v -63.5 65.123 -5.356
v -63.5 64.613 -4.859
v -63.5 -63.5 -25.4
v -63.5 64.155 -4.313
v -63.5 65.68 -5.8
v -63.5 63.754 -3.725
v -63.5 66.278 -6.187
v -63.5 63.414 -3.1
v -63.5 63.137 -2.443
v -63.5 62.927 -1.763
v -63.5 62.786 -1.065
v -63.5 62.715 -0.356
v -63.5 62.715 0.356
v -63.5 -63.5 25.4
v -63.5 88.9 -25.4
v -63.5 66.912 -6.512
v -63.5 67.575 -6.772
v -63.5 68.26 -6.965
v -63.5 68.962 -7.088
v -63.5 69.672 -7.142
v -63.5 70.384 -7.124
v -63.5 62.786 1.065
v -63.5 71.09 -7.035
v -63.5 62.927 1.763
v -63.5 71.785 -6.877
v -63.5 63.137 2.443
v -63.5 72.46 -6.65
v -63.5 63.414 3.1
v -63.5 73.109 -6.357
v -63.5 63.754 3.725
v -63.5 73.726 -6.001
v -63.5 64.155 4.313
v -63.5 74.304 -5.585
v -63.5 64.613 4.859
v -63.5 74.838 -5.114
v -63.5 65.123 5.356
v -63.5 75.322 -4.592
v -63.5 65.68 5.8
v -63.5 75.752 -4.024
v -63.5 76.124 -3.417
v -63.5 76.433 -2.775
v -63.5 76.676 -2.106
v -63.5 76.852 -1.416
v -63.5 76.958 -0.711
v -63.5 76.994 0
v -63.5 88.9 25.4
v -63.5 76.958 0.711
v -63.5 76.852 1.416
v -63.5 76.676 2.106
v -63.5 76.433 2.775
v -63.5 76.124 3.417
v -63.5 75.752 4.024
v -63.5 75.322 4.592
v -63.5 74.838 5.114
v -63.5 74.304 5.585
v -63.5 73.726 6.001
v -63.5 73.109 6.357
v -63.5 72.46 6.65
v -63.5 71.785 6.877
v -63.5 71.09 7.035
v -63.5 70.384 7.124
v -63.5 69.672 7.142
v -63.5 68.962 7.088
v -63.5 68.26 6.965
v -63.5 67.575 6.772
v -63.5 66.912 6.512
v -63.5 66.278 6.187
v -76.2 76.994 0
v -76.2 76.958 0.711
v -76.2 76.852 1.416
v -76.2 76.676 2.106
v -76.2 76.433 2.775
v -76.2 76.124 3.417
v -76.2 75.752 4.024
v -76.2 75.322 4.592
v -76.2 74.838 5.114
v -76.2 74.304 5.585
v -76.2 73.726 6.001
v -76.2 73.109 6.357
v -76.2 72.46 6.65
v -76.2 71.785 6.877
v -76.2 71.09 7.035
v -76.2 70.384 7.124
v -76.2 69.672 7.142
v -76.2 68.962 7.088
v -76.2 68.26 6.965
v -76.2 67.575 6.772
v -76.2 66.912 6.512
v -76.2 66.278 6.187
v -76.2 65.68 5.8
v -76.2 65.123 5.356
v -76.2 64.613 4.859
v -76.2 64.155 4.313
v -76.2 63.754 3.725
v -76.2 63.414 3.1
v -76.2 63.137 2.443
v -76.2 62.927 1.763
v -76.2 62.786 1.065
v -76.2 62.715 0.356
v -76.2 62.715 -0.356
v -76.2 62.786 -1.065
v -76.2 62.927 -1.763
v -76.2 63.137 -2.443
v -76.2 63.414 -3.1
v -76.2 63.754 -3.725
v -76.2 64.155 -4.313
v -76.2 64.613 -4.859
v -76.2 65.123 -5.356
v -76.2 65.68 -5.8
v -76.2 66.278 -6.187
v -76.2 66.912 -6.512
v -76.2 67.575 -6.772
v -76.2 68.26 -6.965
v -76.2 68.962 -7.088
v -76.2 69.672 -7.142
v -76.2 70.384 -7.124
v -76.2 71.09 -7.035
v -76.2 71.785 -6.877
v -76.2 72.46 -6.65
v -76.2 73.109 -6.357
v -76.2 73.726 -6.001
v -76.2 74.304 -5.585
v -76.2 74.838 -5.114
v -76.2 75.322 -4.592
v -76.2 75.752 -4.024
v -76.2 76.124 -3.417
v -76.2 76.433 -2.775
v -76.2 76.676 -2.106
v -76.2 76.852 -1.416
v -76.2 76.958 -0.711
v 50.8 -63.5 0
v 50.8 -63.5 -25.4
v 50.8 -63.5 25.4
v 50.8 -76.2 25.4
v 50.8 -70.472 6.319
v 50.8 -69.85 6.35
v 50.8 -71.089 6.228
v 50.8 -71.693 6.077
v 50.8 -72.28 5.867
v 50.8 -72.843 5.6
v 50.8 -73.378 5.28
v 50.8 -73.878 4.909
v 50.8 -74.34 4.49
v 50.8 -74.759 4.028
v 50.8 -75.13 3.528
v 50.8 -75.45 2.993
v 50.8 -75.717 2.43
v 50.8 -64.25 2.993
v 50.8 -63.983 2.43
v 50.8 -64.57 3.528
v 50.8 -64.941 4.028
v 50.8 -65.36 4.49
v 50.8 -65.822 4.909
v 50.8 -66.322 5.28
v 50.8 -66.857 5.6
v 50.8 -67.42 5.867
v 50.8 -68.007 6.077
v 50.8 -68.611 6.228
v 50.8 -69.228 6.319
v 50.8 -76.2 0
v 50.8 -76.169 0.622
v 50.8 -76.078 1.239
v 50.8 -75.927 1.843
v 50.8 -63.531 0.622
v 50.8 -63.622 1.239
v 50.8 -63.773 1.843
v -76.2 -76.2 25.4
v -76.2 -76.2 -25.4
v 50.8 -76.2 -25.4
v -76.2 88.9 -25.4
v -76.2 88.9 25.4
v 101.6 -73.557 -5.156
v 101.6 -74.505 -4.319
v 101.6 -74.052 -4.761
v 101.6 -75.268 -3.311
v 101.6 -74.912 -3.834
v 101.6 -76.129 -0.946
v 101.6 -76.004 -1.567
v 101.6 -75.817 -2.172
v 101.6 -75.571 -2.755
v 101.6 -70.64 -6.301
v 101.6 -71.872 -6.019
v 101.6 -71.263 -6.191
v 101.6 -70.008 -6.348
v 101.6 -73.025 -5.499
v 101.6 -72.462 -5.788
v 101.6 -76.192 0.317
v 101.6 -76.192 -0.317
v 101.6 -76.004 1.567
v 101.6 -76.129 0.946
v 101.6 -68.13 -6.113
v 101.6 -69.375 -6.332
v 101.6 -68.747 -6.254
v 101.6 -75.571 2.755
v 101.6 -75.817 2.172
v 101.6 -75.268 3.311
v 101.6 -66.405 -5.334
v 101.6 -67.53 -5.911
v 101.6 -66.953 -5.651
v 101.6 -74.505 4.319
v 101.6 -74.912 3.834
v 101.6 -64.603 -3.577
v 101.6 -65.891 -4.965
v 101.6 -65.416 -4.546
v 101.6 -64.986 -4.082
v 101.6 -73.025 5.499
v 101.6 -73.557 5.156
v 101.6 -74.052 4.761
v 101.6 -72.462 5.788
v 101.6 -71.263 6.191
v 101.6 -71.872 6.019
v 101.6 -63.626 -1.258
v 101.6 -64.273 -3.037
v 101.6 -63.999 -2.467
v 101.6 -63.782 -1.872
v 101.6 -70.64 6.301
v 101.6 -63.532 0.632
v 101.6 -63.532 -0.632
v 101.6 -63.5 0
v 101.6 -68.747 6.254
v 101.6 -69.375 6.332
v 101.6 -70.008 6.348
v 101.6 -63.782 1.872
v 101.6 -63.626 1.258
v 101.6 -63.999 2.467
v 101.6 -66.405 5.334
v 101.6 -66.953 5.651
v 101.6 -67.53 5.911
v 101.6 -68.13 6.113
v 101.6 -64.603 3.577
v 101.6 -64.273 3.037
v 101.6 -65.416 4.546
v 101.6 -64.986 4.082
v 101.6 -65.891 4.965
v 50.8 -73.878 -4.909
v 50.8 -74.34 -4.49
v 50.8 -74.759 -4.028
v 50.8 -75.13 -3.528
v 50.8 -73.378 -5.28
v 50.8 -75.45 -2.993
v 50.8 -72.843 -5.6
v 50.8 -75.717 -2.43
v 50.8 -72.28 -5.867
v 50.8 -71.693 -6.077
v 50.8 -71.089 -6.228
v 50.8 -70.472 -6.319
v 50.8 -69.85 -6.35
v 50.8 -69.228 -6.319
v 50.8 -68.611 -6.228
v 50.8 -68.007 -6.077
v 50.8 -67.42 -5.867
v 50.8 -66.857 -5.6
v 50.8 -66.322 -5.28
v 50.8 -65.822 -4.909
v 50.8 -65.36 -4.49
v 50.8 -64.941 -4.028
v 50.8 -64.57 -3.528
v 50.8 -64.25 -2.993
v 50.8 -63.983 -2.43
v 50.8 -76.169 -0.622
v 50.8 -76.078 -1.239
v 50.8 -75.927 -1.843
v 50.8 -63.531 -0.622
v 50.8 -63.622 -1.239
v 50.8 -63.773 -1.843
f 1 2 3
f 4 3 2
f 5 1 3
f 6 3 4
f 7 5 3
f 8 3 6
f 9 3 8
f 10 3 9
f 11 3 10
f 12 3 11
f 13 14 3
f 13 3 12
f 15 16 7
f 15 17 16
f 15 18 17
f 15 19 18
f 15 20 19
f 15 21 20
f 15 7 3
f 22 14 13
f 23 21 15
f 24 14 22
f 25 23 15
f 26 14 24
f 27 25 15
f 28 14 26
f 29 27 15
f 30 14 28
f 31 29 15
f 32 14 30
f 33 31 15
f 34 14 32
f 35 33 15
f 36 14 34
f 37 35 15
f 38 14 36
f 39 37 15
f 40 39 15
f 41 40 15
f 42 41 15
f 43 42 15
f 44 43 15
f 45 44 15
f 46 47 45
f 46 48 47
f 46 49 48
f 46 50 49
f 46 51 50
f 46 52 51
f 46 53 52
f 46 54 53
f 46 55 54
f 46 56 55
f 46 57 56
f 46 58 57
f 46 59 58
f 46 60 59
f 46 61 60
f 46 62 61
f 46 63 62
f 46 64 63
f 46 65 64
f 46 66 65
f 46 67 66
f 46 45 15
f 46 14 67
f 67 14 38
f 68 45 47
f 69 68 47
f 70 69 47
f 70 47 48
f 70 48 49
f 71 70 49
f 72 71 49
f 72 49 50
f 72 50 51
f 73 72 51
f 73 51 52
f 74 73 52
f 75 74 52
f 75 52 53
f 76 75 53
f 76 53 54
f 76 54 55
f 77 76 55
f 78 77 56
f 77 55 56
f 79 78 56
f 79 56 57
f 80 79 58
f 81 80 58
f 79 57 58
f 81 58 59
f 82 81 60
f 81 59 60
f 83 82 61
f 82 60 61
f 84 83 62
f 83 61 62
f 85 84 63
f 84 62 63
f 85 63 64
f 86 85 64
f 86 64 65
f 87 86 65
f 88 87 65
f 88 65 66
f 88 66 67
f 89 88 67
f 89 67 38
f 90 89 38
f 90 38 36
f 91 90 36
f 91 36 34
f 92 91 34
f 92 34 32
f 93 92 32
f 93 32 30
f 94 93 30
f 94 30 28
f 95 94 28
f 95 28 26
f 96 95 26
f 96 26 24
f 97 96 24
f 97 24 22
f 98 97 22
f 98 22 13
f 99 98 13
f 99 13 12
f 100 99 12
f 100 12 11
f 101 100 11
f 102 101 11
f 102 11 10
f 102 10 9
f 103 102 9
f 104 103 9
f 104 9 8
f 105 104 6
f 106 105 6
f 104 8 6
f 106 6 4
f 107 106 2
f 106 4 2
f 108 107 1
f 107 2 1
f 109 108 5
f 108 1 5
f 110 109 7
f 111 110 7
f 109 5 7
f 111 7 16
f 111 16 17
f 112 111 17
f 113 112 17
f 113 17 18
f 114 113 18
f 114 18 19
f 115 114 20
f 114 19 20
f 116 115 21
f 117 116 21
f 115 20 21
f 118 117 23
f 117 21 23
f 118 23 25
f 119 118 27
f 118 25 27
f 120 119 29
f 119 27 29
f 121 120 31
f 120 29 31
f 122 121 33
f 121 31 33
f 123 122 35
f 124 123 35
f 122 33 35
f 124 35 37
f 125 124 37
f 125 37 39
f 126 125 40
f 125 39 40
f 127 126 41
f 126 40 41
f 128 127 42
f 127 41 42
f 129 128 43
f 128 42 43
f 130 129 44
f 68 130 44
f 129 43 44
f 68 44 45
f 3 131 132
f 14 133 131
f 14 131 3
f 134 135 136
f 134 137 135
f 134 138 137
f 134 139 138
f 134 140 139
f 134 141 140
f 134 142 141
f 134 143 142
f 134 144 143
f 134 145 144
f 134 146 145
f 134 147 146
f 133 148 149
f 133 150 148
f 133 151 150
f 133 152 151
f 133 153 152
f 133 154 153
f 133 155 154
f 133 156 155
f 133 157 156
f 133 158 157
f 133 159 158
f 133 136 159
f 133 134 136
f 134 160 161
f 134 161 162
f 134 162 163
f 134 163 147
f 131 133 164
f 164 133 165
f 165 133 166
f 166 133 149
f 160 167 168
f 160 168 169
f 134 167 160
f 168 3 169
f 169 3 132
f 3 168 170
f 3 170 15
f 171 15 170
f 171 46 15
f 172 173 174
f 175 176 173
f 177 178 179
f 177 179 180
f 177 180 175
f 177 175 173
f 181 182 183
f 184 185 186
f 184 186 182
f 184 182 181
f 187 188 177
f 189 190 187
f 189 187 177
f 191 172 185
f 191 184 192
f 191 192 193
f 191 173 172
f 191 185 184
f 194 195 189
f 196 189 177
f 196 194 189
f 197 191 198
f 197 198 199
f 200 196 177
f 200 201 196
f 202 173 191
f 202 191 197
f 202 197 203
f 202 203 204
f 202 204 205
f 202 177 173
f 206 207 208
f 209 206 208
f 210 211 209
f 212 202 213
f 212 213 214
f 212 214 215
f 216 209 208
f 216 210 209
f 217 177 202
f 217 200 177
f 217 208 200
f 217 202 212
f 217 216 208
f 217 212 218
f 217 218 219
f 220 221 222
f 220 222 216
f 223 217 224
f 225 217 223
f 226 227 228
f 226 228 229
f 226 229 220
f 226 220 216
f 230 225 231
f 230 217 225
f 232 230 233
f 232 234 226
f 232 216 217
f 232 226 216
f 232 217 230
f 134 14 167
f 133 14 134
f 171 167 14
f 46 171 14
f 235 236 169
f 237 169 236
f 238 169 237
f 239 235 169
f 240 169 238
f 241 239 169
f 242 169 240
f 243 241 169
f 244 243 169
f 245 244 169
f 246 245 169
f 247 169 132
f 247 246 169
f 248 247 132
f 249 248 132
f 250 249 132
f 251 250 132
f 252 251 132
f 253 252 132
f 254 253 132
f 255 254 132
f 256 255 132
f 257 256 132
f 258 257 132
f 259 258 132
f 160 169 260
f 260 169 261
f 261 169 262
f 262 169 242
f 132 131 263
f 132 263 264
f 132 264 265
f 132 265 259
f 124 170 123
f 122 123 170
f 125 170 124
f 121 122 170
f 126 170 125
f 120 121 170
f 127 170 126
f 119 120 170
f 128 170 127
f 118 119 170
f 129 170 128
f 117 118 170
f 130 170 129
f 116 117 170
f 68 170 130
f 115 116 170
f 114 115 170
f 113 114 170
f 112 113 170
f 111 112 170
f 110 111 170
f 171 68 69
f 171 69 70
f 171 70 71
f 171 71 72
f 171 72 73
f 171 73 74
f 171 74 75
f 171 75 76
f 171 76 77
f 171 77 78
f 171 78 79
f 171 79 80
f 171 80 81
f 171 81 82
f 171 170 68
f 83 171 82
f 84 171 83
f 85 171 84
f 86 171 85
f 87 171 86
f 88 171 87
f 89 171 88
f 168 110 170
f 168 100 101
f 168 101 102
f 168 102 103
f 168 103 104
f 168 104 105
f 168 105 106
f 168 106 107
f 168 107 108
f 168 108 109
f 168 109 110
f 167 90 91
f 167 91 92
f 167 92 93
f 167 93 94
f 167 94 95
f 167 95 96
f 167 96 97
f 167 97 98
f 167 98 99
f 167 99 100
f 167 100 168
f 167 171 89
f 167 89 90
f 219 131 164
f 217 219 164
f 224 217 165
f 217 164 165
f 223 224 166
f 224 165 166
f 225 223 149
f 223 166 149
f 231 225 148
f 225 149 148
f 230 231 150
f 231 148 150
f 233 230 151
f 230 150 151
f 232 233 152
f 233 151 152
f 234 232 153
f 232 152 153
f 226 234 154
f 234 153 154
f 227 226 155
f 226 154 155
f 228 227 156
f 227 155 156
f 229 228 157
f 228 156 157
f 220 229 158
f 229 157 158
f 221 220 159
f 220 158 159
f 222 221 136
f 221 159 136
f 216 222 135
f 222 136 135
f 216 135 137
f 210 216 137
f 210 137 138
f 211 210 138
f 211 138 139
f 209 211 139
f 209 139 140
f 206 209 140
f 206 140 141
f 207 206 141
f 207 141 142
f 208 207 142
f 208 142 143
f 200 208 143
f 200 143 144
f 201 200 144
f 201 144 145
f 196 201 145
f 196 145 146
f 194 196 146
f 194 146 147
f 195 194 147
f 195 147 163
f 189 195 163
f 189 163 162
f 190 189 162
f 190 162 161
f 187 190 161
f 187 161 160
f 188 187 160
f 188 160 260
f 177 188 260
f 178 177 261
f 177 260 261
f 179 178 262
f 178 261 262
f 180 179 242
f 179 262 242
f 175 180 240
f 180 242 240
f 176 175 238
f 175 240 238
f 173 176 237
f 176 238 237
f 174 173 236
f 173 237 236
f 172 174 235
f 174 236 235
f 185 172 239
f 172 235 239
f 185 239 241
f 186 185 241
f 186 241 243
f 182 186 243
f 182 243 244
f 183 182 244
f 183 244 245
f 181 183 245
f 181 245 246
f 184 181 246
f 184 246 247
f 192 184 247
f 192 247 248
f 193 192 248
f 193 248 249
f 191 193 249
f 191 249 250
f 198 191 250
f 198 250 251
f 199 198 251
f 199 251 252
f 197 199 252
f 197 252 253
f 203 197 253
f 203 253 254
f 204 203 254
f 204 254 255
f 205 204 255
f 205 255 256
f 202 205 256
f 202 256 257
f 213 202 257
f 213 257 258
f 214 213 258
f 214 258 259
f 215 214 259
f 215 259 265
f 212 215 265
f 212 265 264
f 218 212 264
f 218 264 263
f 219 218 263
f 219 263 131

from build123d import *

# Parameters (mm, degrees)
F1_DEPTH = 25.4
F2_R     = 7.14375
F3_DEPTH = 76.201
F5_DEPTH = 50.8


with BuildPart() as f1:
    # F0 (on Top) → F1 (new body, symmetric)
    with BuildSketch(Plane.XY):
        Polygon((-63.5, 88.9), (-76.2, 88.9), (-76.2, -76.2), (50.8, -76.2), (50.8, -63.5), (-63.5, -63.5), align=None)
    extrude(amount=F1_DEPTH, both=True)

    # F2 (on Right) → F3 (cut, through all)
    with BuildSketch(Plane.YZ):
        with Locations((69.85, 0)):
            Circle(F2_R)
    extrude(amount=-F3_DEPTH, mode=Mode.SUBTRACT)

    # F4 (on face) → F5 (join)
    with BuildSketch(Plane.YZ.offset(50.8)):
        with BuildLine():
            ThreePointArc((-76.2, -2.08e-08), (-69.8499999896, -6.35), (-63.5, 0))
            ThreePointArc((-63.5, 0), (-69.8500000104, 6.35), (-76.2, -2.08e-08))
        make_face()
    extrude(amount=F5_DEPTH)


solid = f1.part
